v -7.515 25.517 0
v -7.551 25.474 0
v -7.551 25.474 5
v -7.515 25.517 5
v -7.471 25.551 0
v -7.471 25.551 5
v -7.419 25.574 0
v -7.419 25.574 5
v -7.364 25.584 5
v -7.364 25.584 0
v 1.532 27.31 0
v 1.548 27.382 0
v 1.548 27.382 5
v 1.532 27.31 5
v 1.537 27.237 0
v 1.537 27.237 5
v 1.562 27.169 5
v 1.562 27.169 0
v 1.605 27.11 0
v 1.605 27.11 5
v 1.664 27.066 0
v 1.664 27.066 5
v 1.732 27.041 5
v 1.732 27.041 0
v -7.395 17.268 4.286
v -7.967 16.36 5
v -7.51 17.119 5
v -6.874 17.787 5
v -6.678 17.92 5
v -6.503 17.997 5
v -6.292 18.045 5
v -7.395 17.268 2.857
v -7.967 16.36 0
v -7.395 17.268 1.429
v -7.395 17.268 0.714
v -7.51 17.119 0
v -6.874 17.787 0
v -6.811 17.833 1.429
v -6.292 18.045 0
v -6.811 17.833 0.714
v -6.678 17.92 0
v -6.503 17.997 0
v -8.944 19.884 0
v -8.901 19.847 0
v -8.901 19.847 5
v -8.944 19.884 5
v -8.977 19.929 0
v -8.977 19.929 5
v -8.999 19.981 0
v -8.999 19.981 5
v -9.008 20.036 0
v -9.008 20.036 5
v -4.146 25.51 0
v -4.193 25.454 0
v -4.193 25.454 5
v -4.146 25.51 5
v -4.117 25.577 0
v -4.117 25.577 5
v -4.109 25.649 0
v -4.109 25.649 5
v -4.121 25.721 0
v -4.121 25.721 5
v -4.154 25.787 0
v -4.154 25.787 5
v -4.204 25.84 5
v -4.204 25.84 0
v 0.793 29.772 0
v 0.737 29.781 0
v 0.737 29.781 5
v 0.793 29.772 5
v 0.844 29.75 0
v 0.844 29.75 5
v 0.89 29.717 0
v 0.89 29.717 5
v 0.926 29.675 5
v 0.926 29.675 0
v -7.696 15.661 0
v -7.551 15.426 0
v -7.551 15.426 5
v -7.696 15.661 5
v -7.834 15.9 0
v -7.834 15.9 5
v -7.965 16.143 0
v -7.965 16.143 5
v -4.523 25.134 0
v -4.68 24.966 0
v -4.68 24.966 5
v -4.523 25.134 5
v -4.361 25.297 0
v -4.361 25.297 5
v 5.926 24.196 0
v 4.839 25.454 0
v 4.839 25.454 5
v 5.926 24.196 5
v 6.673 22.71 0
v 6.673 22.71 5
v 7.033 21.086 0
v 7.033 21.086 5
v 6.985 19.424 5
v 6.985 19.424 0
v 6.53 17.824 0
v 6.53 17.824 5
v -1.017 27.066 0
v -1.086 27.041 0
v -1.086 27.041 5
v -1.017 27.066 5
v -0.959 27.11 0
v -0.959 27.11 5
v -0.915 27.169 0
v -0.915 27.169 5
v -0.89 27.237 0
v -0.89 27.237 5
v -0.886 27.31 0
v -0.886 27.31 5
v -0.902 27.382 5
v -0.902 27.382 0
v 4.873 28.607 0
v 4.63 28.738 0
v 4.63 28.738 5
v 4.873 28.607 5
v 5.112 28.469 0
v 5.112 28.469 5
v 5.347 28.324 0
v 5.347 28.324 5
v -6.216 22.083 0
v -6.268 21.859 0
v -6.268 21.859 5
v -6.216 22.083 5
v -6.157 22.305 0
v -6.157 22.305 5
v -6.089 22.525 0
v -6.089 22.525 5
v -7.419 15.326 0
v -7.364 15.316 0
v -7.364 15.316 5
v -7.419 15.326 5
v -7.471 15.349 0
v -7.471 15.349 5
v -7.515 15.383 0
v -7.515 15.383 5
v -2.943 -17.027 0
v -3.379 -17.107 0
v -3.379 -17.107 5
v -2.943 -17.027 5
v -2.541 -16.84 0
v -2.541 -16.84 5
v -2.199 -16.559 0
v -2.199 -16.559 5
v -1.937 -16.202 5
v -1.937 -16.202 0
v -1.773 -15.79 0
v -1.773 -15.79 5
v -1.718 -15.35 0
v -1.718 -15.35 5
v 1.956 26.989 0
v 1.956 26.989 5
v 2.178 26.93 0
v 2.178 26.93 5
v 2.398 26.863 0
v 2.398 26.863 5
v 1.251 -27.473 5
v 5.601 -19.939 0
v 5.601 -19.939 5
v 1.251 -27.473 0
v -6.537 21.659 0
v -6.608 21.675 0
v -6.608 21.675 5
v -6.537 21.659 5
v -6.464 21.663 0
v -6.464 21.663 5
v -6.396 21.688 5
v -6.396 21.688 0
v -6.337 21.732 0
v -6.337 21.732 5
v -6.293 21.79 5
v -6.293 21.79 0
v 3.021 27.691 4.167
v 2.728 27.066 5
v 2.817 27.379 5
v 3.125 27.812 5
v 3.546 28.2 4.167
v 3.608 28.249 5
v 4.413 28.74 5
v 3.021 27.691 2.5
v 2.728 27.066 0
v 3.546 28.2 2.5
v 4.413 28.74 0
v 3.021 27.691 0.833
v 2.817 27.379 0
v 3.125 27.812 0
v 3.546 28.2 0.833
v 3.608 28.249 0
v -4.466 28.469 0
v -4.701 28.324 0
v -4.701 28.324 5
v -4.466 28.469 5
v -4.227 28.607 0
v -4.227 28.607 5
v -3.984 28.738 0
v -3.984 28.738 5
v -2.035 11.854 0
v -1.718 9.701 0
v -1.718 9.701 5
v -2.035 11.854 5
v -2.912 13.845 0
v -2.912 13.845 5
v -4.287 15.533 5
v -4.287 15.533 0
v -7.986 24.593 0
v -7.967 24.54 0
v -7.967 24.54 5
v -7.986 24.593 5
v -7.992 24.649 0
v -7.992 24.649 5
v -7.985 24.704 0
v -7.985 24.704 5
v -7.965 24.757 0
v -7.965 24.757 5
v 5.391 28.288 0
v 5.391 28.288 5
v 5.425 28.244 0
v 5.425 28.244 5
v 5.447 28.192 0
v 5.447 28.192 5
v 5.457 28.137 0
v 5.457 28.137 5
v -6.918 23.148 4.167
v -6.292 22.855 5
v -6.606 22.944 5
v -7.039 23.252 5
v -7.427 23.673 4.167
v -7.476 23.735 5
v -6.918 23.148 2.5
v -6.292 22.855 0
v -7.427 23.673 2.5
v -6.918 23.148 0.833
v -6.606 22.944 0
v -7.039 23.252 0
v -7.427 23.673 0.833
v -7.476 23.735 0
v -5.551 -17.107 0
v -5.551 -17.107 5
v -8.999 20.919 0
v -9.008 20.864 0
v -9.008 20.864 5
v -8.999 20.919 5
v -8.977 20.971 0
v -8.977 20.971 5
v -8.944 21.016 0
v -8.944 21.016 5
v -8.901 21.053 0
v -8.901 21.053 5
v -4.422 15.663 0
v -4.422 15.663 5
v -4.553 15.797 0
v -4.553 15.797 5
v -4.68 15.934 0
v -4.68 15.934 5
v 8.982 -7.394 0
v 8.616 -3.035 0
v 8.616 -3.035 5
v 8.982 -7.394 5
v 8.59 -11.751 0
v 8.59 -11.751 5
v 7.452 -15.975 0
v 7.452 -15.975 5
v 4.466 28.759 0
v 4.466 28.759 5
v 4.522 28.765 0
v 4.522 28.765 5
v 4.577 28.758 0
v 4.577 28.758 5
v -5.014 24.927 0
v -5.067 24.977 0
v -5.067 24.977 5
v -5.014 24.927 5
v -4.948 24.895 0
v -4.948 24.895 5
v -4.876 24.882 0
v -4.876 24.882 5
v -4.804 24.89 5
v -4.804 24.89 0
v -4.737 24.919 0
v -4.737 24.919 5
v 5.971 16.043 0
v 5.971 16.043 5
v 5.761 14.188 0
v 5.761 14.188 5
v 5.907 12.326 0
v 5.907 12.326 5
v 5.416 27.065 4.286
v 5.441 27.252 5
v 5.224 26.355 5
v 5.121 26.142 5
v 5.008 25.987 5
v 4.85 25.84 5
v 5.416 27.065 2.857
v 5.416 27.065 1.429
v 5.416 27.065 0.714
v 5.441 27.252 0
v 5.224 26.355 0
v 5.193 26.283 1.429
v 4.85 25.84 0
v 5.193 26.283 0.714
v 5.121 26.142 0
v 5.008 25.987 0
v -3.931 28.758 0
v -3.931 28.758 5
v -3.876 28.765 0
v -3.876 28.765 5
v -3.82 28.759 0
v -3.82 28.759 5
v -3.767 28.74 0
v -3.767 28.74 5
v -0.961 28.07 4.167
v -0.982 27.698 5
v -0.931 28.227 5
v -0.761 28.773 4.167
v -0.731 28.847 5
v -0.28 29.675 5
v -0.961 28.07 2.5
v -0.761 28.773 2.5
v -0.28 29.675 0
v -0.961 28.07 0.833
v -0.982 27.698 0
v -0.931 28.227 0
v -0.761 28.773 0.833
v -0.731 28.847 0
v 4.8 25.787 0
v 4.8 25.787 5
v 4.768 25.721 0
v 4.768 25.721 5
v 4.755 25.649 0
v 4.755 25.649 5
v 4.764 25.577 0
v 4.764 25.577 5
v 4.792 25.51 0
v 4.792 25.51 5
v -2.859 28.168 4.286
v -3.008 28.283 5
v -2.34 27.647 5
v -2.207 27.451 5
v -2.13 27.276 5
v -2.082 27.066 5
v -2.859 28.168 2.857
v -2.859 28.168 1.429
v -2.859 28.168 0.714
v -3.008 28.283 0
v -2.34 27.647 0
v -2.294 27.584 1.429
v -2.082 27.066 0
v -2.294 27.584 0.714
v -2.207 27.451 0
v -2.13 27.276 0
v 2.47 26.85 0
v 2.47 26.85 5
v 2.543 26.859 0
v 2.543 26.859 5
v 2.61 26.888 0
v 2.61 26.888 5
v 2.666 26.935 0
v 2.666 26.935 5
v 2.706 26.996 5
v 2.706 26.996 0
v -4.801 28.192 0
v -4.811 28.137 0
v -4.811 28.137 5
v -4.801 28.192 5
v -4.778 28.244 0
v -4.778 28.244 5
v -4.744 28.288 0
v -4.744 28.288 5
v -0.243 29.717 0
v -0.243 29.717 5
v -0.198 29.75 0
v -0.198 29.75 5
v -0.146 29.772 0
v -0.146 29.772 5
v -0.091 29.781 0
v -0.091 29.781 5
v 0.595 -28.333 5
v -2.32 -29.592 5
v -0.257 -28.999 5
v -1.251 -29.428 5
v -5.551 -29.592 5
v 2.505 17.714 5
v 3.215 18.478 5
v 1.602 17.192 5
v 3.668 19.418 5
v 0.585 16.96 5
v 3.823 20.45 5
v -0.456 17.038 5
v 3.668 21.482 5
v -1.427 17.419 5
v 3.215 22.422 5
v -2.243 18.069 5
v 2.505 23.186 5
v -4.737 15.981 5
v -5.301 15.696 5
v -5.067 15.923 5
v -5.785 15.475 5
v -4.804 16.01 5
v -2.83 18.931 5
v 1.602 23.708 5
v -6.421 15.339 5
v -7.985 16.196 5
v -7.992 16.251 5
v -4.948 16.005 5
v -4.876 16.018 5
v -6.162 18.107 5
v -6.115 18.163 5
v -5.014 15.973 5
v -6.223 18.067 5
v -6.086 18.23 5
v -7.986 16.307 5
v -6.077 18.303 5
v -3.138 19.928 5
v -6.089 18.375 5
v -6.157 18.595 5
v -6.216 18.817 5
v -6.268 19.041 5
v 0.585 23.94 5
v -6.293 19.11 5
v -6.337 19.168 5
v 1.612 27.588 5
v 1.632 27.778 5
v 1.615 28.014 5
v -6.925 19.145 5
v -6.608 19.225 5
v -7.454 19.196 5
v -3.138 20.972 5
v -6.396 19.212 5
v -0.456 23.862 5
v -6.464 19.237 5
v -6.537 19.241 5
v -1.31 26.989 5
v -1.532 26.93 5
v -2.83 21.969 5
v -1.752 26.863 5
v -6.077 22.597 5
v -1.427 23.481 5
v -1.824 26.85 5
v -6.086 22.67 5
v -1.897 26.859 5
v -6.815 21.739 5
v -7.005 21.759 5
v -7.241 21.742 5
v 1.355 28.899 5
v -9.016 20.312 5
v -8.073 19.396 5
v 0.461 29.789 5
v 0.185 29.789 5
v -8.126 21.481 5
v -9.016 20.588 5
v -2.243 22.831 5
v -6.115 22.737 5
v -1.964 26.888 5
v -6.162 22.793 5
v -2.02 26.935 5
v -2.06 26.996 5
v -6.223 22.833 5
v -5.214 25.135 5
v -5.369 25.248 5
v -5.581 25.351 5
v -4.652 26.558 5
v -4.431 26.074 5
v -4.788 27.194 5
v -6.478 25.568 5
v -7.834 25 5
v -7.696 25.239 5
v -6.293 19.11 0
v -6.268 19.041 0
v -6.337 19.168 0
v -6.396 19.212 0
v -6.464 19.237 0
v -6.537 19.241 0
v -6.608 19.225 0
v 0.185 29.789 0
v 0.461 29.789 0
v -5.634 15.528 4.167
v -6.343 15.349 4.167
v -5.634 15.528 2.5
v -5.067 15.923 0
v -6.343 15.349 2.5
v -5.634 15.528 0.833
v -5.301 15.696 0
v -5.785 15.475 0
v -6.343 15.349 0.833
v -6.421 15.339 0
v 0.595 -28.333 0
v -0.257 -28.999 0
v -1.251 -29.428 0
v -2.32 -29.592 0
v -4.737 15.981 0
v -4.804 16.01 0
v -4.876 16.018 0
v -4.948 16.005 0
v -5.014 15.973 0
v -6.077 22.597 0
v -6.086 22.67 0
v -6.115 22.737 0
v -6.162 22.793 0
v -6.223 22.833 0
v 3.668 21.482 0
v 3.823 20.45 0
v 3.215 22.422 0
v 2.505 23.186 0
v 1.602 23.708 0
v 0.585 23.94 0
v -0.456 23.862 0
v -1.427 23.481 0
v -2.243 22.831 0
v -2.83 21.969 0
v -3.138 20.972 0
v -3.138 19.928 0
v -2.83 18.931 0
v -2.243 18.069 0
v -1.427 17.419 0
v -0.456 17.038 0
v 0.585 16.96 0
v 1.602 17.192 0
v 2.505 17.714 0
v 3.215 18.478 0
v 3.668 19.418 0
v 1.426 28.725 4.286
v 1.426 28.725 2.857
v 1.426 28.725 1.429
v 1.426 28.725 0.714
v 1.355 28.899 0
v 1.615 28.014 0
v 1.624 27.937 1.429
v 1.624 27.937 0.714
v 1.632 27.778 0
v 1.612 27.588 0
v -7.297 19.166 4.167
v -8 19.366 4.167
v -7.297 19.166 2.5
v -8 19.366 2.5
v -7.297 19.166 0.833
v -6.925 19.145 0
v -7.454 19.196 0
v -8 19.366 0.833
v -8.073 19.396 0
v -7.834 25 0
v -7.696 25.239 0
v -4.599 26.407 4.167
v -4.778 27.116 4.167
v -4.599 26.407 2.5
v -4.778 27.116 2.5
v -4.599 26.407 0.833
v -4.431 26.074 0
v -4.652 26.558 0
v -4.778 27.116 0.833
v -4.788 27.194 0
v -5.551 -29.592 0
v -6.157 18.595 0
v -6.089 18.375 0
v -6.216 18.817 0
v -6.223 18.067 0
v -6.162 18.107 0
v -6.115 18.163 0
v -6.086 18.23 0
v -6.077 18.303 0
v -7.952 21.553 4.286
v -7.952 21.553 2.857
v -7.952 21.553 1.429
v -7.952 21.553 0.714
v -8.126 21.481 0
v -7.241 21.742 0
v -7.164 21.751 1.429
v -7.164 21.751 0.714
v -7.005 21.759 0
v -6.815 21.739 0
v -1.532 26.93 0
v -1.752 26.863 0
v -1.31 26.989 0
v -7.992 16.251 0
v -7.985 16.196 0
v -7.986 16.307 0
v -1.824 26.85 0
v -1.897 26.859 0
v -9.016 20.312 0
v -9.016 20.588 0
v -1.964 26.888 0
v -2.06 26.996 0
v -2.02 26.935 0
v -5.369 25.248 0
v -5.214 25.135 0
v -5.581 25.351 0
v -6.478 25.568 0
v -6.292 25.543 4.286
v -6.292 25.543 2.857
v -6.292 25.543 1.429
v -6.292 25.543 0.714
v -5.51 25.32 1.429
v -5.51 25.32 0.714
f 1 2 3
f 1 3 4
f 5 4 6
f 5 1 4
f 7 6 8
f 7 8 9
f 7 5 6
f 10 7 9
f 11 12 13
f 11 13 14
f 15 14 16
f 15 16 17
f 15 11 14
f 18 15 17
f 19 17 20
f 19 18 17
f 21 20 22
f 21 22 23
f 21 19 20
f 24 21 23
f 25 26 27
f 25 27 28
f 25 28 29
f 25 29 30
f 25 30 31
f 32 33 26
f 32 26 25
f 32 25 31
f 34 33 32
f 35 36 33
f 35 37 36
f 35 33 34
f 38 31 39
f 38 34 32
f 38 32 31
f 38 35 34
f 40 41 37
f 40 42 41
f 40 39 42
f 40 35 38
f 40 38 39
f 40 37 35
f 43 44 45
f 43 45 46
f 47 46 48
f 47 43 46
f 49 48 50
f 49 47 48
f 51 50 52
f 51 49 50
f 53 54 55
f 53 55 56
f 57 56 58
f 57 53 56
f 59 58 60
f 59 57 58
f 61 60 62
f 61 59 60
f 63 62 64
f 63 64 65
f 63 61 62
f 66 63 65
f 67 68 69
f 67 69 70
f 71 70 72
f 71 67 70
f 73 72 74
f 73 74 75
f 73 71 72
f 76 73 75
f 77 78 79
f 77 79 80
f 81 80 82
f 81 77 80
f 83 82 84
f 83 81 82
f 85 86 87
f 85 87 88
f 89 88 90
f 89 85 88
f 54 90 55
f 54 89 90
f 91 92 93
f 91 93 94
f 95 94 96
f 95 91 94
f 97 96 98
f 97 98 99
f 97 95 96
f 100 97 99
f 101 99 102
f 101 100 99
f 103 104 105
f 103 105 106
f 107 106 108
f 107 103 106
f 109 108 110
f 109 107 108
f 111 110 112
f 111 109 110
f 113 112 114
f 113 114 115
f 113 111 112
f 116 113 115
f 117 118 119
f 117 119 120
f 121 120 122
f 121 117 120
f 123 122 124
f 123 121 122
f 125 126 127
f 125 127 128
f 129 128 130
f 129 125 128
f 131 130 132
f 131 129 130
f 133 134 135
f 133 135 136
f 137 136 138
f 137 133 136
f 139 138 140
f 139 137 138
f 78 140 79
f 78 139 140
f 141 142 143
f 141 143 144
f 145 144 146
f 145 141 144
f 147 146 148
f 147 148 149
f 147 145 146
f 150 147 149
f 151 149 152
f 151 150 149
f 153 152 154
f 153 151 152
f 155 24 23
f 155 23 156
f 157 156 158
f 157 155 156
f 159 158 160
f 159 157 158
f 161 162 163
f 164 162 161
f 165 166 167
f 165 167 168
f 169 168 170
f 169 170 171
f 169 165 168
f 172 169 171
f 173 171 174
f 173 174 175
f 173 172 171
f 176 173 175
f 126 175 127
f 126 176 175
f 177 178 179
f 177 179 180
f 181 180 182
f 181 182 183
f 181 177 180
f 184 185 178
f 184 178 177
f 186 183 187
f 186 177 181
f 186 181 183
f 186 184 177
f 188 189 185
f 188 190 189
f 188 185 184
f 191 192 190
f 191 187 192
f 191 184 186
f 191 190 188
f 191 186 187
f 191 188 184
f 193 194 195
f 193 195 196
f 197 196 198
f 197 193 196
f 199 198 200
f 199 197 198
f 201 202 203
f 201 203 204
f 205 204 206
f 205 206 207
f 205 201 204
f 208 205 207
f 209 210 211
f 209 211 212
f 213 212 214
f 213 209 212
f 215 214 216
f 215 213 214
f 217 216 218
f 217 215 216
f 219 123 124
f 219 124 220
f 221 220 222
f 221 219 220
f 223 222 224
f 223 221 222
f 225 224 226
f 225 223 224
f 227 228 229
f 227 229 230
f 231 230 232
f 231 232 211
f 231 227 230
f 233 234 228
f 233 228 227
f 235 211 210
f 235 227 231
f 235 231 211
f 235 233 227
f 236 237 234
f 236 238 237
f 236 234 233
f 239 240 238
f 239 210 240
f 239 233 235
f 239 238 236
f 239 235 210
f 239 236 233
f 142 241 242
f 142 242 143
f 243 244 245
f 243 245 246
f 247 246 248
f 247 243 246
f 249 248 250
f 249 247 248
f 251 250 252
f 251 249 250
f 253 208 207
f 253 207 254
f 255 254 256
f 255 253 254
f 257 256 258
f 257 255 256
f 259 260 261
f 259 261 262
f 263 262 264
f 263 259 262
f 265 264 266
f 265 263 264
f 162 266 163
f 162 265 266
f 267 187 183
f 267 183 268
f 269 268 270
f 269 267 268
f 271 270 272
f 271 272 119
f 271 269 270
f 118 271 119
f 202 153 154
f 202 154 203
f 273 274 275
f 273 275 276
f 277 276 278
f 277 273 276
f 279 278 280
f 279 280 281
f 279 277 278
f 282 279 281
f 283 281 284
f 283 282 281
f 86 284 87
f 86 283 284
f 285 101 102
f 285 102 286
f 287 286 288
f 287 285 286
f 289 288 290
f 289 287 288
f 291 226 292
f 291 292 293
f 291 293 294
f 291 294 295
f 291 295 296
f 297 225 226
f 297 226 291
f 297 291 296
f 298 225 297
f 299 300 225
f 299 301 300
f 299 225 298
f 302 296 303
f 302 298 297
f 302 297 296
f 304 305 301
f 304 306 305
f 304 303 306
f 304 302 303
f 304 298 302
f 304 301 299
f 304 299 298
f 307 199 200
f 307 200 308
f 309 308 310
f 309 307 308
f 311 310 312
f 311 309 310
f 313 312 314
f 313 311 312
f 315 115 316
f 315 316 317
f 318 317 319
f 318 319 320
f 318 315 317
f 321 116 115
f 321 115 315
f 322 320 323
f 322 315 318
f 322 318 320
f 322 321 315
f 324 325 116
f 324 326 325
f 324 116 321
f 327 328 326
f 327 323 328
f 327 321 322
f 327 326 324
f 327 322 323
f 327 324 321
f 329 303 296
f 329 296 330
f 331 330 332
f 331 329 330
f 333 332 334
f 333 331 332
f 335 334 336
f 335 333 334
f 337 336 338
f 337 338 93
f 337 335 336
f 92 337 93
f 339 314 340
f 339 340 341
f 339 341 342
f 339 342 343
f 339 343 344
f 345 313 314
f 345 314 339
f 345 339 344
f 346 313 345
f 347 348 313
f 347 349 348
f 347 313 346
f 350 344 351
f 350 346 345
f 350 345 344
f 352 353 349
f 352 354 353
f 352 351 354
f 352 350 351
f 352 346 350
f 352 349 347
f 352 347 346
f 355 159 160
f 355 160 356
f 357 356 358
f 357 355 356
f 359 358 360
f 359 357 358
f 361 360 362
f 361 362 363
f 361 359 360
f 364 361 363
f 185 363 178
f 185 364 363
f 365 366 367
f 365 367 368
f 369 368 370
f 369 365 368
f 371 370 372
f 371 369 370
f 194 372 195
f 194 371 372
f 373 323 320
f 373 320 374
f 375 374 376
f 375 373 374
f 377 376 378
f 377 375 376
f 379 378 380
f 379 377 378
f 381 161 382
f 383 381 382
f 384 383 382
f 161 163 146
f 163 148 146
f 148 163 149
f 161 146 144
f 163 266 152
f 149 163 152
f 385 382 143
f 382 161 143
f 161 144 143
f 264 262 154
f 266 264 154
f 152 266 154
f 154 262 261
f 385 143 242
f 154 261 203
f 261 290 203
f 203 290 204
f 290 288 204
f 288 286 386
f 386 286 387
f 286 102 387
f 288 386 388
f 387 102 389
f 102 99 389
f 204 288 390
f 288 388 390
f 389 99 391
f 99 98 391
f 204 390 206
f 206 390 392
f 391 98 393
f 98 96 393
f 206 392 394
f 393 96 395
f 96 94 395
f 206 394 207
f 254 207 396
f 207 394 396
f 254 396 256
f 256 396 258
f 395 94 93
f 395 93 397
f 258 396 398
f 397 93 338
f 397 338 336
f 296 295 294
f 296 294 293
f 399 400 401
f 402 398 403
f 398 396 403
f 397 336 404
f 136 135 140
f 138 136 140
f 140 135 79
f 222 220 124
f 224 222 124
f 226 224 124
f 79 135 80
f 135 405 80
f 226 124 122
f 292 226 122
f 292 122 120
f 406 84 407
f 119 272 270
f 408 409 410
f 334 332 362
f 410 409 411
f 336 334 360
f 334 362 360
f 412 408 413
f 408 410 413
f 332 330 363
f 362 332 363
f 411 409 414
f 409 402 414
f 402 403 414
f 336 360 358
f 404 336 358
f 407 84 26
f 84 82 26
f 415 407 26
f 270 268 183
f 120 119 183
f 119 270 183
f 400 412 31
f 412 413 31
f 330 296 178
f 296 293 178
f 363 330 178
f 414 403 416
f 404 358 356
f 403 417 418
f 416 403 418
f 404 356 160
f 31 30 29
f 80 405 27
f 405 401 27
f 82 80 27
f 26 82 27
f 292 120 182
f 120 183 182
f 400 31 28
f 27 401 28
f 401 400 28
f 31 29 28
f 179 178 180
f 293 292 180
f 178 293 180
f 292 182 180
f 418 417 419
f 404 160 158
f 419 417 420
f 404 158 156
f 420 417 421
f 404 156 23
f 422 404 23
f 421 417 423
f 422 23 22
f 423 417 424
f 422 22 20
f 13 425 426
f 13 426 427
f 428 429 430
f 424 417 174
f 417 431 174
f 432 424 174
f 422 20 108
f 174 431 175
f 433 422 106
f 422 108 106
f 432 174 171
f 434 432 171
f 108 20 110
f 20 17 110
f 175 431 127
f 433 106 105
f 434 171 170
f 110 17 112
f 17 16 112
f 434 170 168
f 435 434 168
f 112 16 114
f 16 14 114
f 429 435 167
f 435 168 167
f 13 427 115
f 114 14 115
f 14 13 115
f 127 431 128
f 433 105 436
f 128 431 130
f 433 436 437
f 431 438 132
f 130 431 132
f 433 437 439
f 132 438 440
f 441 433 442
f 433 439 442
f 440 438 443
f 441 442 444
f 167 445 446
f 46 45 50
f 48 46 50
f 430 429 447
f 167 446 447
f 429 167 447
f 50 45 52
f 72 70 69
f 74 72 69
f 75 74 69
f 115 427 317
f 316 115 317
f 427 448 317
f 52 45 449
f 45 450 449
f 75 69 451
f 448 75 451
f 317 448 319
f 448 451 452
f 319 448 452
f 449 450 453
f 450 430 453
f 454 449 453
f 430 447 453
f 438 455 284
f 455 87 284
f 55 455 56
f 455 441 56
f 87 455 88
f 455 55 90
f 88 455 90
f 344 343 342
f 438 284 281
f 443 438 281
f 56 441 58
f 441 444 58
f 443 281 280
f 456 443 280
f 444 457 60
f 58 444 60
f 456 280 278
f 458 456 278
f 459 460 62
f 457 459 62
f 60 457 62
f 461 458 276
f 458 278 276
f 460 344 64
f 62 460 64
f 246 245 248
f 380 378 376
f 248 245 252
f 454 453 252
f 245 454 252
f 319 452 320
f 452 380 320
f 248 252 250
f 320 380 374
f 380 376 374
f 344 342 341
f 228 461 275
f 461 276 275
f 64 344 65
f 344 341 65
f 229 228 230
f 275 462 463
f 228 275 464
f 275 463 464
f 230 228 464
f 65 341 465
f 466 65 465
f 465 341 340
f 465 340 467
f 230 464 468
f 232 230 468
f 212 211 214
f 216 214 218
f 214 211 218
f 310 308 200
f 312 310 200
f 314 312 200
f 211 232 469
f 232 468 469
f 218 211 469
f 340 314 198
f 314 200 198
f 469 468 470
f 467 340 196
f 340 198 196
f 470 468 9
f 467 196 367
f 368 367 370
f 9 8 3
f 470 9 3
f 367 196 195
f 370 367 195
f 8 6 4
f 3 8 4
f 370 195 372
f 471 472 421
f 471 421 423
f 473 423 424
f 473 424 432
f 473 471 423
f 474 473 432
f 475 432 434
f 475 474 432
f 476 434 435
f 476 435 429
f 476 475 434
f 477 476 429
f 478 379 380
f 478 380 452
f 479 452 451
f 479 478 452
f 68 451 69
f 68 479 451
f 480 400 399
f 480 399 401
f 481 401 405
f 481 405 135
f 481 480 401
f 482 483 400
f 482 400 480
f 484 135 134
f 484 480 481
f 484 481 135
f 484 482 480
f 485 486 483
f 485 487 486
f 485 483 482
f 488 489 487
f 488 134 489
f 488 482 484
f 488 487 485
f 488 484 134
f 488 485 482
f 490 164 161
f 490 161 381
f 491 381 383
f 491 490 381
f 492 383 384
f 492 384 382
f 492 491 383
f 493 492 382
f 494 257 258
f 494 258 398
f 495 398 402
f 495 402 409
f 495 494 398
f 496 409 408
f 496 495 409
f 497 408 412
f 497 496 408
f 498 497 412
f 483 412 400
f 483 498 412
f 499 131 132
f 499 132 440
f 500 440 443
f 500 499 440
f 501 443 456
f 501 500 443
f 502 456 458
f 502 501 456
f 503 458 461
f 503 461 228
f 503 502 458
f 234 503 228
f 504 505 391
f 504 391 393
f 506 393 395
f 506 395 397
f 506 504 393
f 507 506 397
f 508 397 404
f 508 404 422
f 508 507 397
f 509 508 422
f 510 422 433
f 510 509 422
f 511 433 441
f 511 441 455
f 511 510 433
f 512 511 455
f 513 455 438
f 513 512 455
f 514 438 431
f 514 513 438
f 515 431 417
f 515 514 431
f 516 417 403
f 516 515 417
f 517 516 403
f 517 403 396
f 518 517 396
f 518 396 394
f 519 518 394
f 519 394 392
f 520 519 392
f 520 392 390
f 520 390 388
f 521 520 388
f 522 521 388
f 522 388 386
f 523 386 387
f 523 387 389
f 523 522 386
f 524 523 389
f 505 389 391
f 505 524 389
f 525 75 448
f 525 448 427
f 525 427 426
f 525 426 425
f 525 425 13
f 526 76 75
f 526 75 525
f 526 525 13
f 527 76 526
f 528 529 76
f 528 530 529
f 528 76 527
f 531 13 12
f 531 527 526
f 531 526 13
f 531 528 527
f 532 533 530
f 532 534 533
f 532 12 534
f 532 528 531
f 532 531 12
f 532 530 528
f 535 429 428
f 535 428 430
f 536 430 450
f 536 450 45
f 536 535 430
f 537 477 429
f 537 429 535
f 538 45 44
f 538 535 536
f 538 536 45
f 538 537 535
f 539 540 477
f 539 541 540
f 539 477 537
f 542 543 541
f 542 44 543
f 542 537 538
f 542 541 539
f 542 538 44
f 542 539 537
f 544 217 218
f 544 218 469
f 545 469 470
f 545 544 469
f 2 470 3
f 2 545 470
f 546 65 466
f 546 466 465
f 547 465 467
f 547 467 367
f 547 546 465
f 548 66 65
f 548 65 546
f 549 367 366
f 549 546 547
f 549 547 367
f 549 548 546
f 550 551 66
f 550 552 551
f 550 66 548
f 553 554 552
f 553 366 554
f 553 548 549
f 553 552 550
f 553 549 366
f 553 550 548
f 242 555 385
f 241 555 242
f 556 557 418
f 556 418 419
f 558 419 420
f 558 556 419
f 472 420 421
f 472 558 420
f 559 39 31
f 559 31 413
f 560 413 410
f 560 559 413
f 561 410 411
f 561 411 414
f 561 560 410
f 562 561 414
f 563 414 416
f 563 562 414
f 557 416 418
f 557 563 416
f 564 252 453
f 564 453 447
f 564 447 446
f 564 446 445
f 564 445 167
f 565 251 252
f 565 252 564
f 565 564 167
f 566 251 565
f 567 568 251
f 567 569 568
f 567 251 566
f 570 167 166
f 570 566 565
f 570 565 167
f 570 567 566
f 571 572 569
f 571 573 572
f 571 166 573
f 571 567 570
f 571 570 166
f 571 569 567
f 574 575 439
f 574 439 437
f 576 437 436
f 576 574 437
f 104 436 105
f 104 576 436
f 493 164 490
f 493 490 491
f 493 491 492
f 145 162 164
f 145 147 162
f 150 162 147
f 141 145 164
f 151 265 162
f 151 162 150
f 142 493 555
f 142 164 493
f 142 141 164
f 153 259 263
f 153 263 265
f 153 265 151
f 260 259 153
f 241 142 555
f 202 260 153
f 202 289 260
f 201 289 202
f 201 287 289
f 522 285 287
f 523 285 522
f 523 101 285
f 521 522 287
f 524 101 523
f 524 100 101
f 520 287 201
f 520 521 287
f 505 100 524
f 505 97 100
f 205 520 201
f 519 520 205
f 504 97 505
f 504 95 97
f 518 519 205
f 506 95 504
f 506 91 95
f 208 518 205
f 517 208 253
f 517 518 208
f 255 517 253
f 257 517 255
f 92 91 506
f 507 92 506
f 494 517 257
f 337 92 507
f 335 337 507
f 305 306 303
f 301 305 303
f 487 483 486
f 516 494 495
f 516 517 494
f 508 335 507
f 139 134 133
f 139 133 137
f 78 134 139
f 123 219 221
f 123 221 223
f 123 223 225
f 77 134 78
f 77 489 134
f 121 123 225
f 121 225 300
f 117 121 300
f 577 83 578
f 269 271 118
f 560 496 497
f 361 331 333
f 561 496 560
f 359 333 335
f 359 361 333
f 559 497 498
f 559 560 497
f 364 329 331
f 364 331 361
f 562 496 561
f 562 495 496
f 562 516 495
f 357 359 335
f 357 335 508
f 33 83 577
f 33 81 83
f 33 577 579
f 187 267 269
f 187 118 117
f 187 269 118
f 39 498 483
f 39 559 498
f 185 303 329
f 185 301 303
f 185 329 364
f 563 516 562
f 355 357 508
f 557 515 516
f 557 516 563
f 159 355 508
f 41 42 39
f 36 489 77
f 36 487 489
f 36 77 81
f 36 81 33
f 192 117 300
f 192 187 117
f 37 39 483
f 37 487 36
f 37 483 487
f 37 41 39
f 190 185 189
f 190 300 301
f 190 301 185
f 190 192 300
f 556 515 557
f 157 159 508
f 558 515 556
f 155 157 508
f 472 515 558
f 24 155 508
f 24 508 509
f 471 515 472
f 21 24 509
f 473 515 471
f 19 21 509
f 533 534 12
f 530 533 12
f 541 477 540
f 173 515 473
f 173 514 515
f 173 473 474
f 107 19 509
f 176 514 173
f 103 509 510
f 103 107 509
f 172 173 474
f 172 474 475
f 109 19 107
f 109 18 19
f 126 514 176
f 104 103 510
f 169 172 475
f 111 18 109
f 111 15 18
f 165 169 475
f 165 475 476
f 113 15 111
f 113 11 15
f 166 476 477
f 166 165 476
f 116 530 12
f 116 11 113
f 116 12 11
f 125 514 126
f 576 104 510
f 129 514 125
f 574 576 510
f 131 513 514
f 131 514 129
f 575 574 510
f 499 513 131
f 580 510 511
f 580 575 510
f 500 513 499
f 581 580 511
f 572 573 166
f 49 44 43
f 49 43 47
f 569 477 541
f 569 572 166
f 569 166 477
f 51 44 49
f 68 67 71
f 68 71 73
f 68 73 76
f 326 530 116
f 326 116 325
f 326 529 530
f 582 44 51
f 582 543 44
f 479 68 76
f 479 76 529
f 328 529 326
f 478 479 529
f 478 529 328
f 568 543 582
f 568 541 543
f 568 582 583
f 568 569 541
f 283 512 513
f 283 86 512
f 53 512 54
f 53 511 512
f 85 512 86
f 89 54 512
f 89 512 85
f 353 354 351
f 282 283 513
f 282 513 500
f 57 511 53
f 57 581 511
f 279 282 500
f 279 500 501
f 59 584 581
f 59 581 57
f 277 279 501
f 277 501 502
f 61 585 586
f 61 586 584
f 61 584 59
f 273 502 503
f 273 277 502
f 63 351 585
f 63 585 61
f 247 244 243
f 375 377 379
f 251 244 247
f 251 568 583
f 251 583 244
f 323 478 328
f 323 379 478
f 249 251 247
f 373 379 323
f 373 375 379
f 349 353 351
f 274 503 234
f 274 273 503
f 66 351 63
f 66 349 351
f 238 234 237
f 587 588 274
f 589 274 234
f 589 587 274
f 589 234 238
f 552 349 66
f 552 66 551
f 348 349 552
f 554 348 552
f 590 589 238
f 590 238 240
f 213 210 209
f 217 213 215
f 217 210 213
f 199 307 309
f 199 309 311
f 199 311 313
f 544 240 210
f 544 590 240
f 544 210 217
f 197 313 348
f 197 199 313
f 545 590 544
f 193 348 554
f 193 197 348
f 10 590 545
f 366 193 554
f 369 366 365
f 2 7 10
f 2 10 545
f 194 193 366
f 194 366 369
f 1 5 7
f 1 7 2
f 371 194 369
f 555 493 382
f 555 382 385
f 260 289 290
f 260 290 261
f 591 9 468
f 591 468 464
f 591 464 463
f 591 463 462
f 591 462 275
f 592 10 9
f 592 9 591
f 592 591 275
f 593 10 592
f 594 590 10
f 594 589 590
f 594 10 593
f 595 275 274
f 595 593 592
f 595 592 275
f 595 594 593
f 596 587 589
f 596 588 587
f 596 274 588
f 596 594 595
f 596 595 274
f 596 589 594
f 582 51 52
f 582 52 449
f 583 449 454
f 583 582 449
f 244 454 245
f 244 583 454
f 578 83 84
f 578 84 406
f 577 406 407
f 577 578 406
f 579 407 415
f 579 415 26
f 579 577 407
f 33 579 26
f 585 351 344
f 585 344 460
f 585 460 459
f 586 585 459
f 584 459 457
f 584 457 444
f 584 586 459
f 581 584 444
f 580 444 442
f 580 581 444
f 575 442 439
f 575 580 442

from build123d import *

# Parameters (mm, degrees)
ESQUISSE1_R        = 3.5
BOSS_EXTRU_1_DEPTH = 5


with BuildPart() as part:
    # Esquisse1 → Boss.-Extru.1 (new body)
    with BuildSketch(Plane.XY):
        with BuildLine():
            Line((5.90749079, 12.326495986), (8.616081221, -3.034683677))
            ThreePointArc((8.616081221, -3.034683677), (8.590159921, -11.751121376), (5.60083157, -19.938970549))
            Line((5.60083157, -19.938970549), (1.251100309, -27.472926092))
            ThreePointArc((1.251100309, -27.472926092), (-0.257489724, -28.999497571), (-2.320380522, -29.591735642))
            Line((-2.320380522, -29.591735642), (-5.550979445, -29.591735642))
            Line((-5.550979445, -29.591735642), (-5.550979445, -17.107469849))
            Line((-5.550979445, -17.107469849), (-3.378672956, -17.107469849))
            ThreePointArc((-3.378672956, -17.107469849), (-2.198535402, -16.559306042), (-1.717510344, -15.350247276))
            Line((-1.717510344, -15.350247276), (-1.717510344, 9.701342702))
            ThreePointArc((-1.717510344, 9.701342702), (-2.406894368, 12.879278297), (-4.28656883, 15.53283231))
            ThreePointArc((-4.28656883, 15.53283231), (-4.487711645, 15.729441192), (-4.68047629, 15.934271064))
            ThreePointArc((-4.68047629, 15.934271064), (-4.876370075, 16.017987907), (-5.067106513, 15.923106423))
            add(Edge.make_bspline(
                [(-5.067106513, 15.923106423), (-5.191748055, 15.767851436), (-5.299939447, 15.691192227), (-5.475656017, 15.590422708), (-5.555626682, 15.558374213), (-5.713073438, 15.497624167), (-5.788388923, 15.47301413), (-6.0298478, 15.402875582), (-6.188098951, 15.371946944), (-6.497686976, 15.326706478), (-6.647693738, 15.313871913), (-6.988957126, 15.299473797), (-7.17803548, 15.303219532), (-7.36420262, 15.315613466)],
                knots=[0, 0, 0, 0, 0.081187854, 0.081187854, 0.177126146, 0.177126146, 0.273064439, 0.273064439, 0.491378603, 0.491378603, 0.709692767, 0.709692767, 1, 1, 1, 1], degree=3))
            ThreePointArc((-7.36420262, 15.315613466), (-7.470552259, 15.348577609), (-7.550581738, 15.42598667))
            ThreePointArc((-7.550581738, 15.42598667), (-7.7655753, 15.779999439), (-7.96466262, 16.143195682))
            ThreePointArc((-7.96466262, 16.143195682), (-7.991686109, 16.251207764), (-7.967059097, 16.359791322))
            add(Edge.make_bspline(
                [(-7.967059097, 16.359791322), (-7.853279142, 16.591112501), (-7.721655826, 16.819817791), (-7.510149499, 17.119807091), (-7.454888608, 17.193639283), (-7.275603496, 17.41549623), (-7.144423881, 17.560666055), (-6.923836208, 17.748089252), (-6.871808058, 17.790229571), (-6.766452318, 17.865003383), (-6.719211083, 17.897766079), (-6.592860612, 17.966193375), (-6.508136026, 18.001557991), (-6.358828318, 18.034124778), (-6.326776228, 18.040093733), (-6.292406937, 18.045388672)],
                knots=[0, 0, 0, 0, 0.401379627, 0.401379627, 0.532597128, 0.532597128, 0.79503213, 0.79503213, 0.872293173, 0.872293173, 0.929035384, 0.929035384, 0.985777595, 0.985777595, 1, 1, 1, 1], degree=3))
            ThreePointArc((-6.292406937, 18.045388672), (-6.114868959, 18.163130556), (-6.089423008, 18.374637975))
            ThreePointArc((-6.089423008, 18.374637975), (-6.187238301, 18.705559184), (-6.267988424, 19.041052993))
            ThreePointArc((-6.267988424, 19.041052993), (-6.395778997, 19.211500799), (-6.608402339, 19.224699243))
            add(Edge.make_bspline(
                [(-6.608402339, 19.224699243), (-6.793972575, 19.152565251), (-6.925998674, 19.140272125), (-7.128558447, 19.140861446), (-7.213839323, 19.153091968), (-7.380567237, 19.179204263), (-7.458097378, 19.195549088), (-7.702276169, 19.255536761), (-7.85479, 19.307877348), (-8.145521318, 19.423491963), (-8.281848263, 19.487380282), (-8.58459009, 19.645542843), (-8.746463889, 19.743325926), (-8.901492413, 19.84714297)],
                knots=[0, 0, 0, 0, 0.081187854, 0.081187854, 0.177126147, 0.177126147, 0.27306444, 0.27306444, 0.491378597, 0.491378597, 0.709692753, 0.709692753, 1, 1, 1, 1], degree=3))
            ThreePointArc((-8.901492413, 19.84714297), (-8.977111822, 19.928865573), (-9.007714851, 20.035918521))
            ThreePointArc((-9.007714851, 20.035918521), (-9.016898352, 20.449999352), (-9.007714908, 20.864080185))
            ThreePointArc((-9.007714908, 20.864080185), (-8.977111894, 20.971133137), (-8.901492497, 21.05285575))
            add(Edge.make_bspline(
                [(-8.901492497, 21.05285575), (-8.687295576, 21.196295791), (-8.458953794, 21.328548725), (-8.125789291, 21.482593915), (-8.04101586, 21.518904025), (-7.774821925, 21.621395219), (-7.588632133, 21.681526168), (-7.303886006, 21.733545582), (-7.237758148, 21.744026093), (-7.109130488, 21.756104245), (-7.051837025, 21.760856956), (-6.908200633, 21.756941491), (-6.817144663, 21.745205847), (-6.671557002, 21.698755648), (-6.640814628, 21.687898878), (-6.608402509, 21.675299796)],
                knots=[0, 0, 0, 0, 0.401379628, 0.401379628, 0.532597129, 0.532597129, 0.795032131, 0.795032131, 0.872293174, 0.872293174, 0.929035391, 0.929035391, 0.985777608, 0.985777608, 1, 1, 1, 1], degree=3))
            ThreePointArc((-6.608402509, 21.675299796), (-6.395779169, 21.68849827), (-6.267988619, 21.858946092))
            ThreePointArc((-6.267988619, 21.858946092), (-6.187238542, 22.194439913), (-6.089423296, 22.525361136))
            ThreePointArc((-6.089423296, 22.525361136), (-6.114869276, 22.736868551), (-6.29240727, 22.85461041))
            add(Edge.make_bspline(
                [(-6.29240727, 22.85461041), (-6.489182804, 22.884925658), (-6.609667322, 22.940292548), (-6.784794571, 23.042082802), (-6.852534713, 23.095315181), (-6.983869174, 23.201293048), (-7.042839833, 23.254213152), (-7.22431103, 23.428253393), (-7.330221587, 23.549838585), (-7.524194984, 23.795329432), (-7.610313421, 23.91882181), (-7.793414258, 24.207165522), (-7.884709542, 24.372785062), (-7.967059664, 24.540207528)],
                knots=[0, 0, 0, 0, 0.081187854, 0.081187854, 0.177126145, 0.177126145, 0.273064437, 0.273064437, 0.49137859, 0.49137859, 0.709692742, 0.709692742, 1, 1, 1, 1], degree=3))
            ThreePointArc((-7.967059664, 24.540207528), (-7.991686691, 24.648791083), (-7.964663218, 24.756803169))
            ThreePointArc((-7.964663218, 24.756803169), (-7.765575947, 25.119999439), (-7.550582435, 25.474012237))
            ThreePointArc((-7.550582435, 25.474012237), (-7.470552972, 25.551421306), (-7.364203346, 25.584385467))
            add(Edge.make_bspline(
                [(-7.364203346, 25.584385467), (-7.106983352, 25.601509726), (-6.843107104, 25.601873235), (-6.477555586, 25.568698032), (-6.385984587, 25.557756794), (-6.104208278, 25.513419805), (-5.912897712, 25.472399838), (-5.640290627, 25.375076909), (-5.577781967, 25.351089369), (-5.460348064, 25.297235523), (-5.408354106, 25.272704758), (-5.285919051, 25.197495651), (-5.212930077, 25.141804283), (-5.110072567, 25.028783389), (-5.088877296, 25.004009986), (-5.067107141, 24.976892829)],
                knots=[0, 0, 0, 0, 0.401379626, 0.401379626, 0.532597127, 0.532597127, 0.79503213, 0.79503213, 0.872293172, 0.872293172, 0.929035397, 0.929035397, 0.985777623, 0.985777623, 1, 1, 1, 1], degree=3))
            ThreePointArc((-5.067107141, 24.976892829), (-4.876370689, 24.882011372), (-4.680476916, 24.965728242))
            ThreePointArc((-4.680476916, 24.965728242), (-4.442798388, 25.215899375), (-4.192627288, 25.453577937))
            ThreePointArc((-4.192627288, 25.453577937), (-4.108910445, 25.649471722), (-4.203791929, 25.840208161))
            add(Edge.make_bspline(
                [(-4.203791929, 25.840208161), (-4.359046916, 25.964849702), (-4.435706125, 26.073041095), (-4.536475644, 26.248757664), (-4.568524139, 26.328728328), (-4.629274184, 26.486175083), (-4.65388422, 26.561490566), (-4.724022771, 26.802949447), (-4.754951409, 26.961200601), (-4.800191875, 27.270788631), (-4.81302644, 27.420795397), (-4.827424555, 27.762058783), (-4.82367882, 27.951137132), (-4.811284886, 28.137304281)],
                knots=[0, 0, 0, 0, 0.081187854, 0.081187854, 0.177126145, 0.177126145, 0.273064437, 0.273064437, 0.491378605, 0.491378605, 0.709692774, 0.709692774, 1, 1, 1, 1], degree=3))
            ThreePointArc((-4.811284886, 28.137304281), (-4.778320739, 28.243653912), (-4.700911682, 28.323683386))
            ThreePointArc((-4.700911682, 28.323683386), (-4.346898913, 28.538676947), (-3.983702671, 28.737764268))
            ThreePointArc((-3.983702671, 28.737764268), (-3.875690588, 28.764787756), (-3.76710703, 28.740160744))
            add(Edge.make_bspline(
                [(-3.76710703, 28.740160744), (-3.535785851, 28.62638079), (-3.307080562, 28.494757474), (-3.007091263, 28.283251147), (-2.93325907, 28.227990257), (-2.711402123, 28.048705144), (-2.566232297, 27.917525528), (-2.3788091, 27.696937856), (-2.336668783, 27.644909707), (-2.261894967, 27.539553963), (-2.229132267, 27.492312725), (-2.160704964, 27.365962233), (-2.125340346, 27.281237633), (-2.092773566, 27.13192992), (-2.086804616, 27.099877851), (-2.08150968, 27.065508585)],
                knots=[0, 0, 0, 0, 0.401379626, 0.401379626, 0.532597128, 0.532597128, 0.79503213, 0.79503213, 0.872293172, 0.872293172, 0.929035389, 0.929035389, 0.985777605, 0.985777605, 1, 1, 1, 1], degree=3))
            ThreePointArc((-2.08150968, 27.065508585), (-1.963767796, 26.887970607), (-1.752260377, 26.862524656))
            ThreePointArc((-1.752260377, 26.862524656), (-1.421339168, 26.960339948), (-1.085845359, 27.041090072))
            ThreePointArc((-1.085845359, 27.041090072), (-0.915397554, 27.168880644), (-0.90219911, 27.381503987))
            add(Edge.make_bspline(
                [(-0.90219911, 27.381503987), (-0.974333102, 27.567074222), (-0.986626228, 27.699100322), (-0.986036906, 27.901660094), (-0.973806385, 27.986940969), (-0.94769409, 28.153668883), (-0.931349264, 28.231199024), (-0.87136159, 28.475377824), (-0.819020999, 28.627891662), (-0.703406377, 28.918622995), (-0.639518053, 29.054949947), (-0.481355494, 29.357691764), (-0.383572418, 29.519565549), (-0.279755382, 29.674594061)],
                knots=[0, 0, 0, 0, 0.081187854, 0.081187854, 0.177126146, 0.177126146, 0.273064439, 0.273064439, 0.491378608, 0.491378608, 0.709692776, 0.709692776, 1, 1, 1, 1], degree=3))
            ThreePointArc((-0.279755382, 29.674594061), (-0.198032779, 29.75021347), (-0.090979831, 29.780816498))
            ThreePointArc((-0.090979831, 29.780816498), (0.323101, 29.79), (0.737181833, 29.780816556))
            ThreePointArc((0.737181833, 29.780816556), (0.844234784, 29.750213542), (0.925957398, 29.674594145))
            add(Edge.make_bspline(
                [(0.925957398, 29.674594145), (1.069397439, 29.460397223), (1.201650373, 29.232055442), (1.355695563, 28.898890939), (1.392005672, 28.814117508), (1.494496867, 28.547923573), (1.554627816, 28.361733781), (1.60664723, 28.076987654), (1.617127741, 28.010859796), (1.629205892, 27.882232135), (1.633958604, 27.824938672), (1.630043139, 27.681302279), (1.618307494, 27.590246309), (1.571857295, 27.444658647), (1.561000525, 27.413916274), (1.548401444, 27.381504157)],
                knots=[0, 0, 0, 0, 0.401379628, 0.401379628, 0.532597129, 0.532597129, 0.795032131, 0.795032131, 0.872293174, 0.872293174, 0.929035391, 0.929035391, 0.985777609, 0.985777609, 1, 1, 1, 1], degree=3))
            ThreePointArc((1.548401444, 27.381504157), (1.561599917, 27.168880816), (1.73204774, 27.041090267))
            ThreePointArc((1.73204774, 27.041090267), (2.06754156, 26.96034019), (2.398462783, 26.862524944))
            ThreePointArc((2.398462783, 26.862524944), (2.609970199, 26.887970924), (2.727712058, 27.065508918))
            add(Edge.make_bspline(
                [(2.727712058, 27.065508918), (2.758027306, 27.262284452), (2.813394197, 27.382768971), (2.915184451, 27.557896221), (2.968416833, 27.625636366), (3.074394702, 27.756970829), (3.127314808, 27.815941489), (3.301355055, 27.997412691), (3.42294025, 28.10332325), (3.668431107, 28.297296652), (3.79192349, 28.383415091), (4.080267195, 28.56651592), (4.245886722, 28.657811196), (4.413309175, 28.740161311)],
                knots=[0, 0, 0, 0, 0.081187854, 0.081187854, 0.177126149, 0.177126149, 0.273064443, 0.273064443, 0.491378604, 0.491378604, 0.709692764, 0.709692764, 1, 1, 1, 1], degree=3))
            ThreePointArc((4.413309175, 28.740161311), (4.52189273, 28.764788339), (4.629904817, 28.737764865))
            ThreePointArc((4.629904817, 28.737764865), (4.993101087, 28.538677595), (5.347113885, 28.323684083))
            ThreePointArc((5.347113885, 28.323684083), (5.424522954, 28.24365462), (5.457487115, 28.137304994))
            add(Edge.make_bspline(
                [(5.457487115, 28.137304994), (5.474611373, 27.880084999), (5.474974883, 27.61620875), (5.44179968, 27.250657233), (5.430858441, 27.159086233), (5.386521453, 26.877309925), (5.345501487, 26.685999361), (5.248178557, 26.413392275), (5.224191016, 26.350883613), (5.170337177, 26.233449726), (5.145806416, 26.181455785), (5.070597355, 26.059020781), (5.014906027, 25.986031839), (4.901885157, 25.883174318), (4.8771117, 25.861978997), (4.849994477, 25.840208789)],
                knots=[0, 0, 0, 0, 0.401379627, 0.401379627, 0.532597128, 0.532597128, 0.79503213, 0.79503213, 0.872293173, 0.872293173, 0.92903538, 0.92903538, 0.985777588, 0.985777588, 1, 1, 1, 1], degree=3))
            ThreePointArc((4.849994477, 25.840208789), (4.75511302, 25.649472337), (4.83882989, 25.453578564))
            ThreePointArc((4.83882989, 25.453578564), (6.903298268, 21.908976505), (6.530483487, 17.823974353))
            ThreePointArc((6.530483487, 17.823974353), (5.821287087, 15.120303874), (5.90749079, 12.326495986))
        make_face()
        with Locations((0.323101648, 20.45)):
            Circle(ESQUISSE1_R, mode=Mode.SUBTRACT)
    extrude(amount=BOSS_EXTRU_1_DEPTH)


solid = part.part
